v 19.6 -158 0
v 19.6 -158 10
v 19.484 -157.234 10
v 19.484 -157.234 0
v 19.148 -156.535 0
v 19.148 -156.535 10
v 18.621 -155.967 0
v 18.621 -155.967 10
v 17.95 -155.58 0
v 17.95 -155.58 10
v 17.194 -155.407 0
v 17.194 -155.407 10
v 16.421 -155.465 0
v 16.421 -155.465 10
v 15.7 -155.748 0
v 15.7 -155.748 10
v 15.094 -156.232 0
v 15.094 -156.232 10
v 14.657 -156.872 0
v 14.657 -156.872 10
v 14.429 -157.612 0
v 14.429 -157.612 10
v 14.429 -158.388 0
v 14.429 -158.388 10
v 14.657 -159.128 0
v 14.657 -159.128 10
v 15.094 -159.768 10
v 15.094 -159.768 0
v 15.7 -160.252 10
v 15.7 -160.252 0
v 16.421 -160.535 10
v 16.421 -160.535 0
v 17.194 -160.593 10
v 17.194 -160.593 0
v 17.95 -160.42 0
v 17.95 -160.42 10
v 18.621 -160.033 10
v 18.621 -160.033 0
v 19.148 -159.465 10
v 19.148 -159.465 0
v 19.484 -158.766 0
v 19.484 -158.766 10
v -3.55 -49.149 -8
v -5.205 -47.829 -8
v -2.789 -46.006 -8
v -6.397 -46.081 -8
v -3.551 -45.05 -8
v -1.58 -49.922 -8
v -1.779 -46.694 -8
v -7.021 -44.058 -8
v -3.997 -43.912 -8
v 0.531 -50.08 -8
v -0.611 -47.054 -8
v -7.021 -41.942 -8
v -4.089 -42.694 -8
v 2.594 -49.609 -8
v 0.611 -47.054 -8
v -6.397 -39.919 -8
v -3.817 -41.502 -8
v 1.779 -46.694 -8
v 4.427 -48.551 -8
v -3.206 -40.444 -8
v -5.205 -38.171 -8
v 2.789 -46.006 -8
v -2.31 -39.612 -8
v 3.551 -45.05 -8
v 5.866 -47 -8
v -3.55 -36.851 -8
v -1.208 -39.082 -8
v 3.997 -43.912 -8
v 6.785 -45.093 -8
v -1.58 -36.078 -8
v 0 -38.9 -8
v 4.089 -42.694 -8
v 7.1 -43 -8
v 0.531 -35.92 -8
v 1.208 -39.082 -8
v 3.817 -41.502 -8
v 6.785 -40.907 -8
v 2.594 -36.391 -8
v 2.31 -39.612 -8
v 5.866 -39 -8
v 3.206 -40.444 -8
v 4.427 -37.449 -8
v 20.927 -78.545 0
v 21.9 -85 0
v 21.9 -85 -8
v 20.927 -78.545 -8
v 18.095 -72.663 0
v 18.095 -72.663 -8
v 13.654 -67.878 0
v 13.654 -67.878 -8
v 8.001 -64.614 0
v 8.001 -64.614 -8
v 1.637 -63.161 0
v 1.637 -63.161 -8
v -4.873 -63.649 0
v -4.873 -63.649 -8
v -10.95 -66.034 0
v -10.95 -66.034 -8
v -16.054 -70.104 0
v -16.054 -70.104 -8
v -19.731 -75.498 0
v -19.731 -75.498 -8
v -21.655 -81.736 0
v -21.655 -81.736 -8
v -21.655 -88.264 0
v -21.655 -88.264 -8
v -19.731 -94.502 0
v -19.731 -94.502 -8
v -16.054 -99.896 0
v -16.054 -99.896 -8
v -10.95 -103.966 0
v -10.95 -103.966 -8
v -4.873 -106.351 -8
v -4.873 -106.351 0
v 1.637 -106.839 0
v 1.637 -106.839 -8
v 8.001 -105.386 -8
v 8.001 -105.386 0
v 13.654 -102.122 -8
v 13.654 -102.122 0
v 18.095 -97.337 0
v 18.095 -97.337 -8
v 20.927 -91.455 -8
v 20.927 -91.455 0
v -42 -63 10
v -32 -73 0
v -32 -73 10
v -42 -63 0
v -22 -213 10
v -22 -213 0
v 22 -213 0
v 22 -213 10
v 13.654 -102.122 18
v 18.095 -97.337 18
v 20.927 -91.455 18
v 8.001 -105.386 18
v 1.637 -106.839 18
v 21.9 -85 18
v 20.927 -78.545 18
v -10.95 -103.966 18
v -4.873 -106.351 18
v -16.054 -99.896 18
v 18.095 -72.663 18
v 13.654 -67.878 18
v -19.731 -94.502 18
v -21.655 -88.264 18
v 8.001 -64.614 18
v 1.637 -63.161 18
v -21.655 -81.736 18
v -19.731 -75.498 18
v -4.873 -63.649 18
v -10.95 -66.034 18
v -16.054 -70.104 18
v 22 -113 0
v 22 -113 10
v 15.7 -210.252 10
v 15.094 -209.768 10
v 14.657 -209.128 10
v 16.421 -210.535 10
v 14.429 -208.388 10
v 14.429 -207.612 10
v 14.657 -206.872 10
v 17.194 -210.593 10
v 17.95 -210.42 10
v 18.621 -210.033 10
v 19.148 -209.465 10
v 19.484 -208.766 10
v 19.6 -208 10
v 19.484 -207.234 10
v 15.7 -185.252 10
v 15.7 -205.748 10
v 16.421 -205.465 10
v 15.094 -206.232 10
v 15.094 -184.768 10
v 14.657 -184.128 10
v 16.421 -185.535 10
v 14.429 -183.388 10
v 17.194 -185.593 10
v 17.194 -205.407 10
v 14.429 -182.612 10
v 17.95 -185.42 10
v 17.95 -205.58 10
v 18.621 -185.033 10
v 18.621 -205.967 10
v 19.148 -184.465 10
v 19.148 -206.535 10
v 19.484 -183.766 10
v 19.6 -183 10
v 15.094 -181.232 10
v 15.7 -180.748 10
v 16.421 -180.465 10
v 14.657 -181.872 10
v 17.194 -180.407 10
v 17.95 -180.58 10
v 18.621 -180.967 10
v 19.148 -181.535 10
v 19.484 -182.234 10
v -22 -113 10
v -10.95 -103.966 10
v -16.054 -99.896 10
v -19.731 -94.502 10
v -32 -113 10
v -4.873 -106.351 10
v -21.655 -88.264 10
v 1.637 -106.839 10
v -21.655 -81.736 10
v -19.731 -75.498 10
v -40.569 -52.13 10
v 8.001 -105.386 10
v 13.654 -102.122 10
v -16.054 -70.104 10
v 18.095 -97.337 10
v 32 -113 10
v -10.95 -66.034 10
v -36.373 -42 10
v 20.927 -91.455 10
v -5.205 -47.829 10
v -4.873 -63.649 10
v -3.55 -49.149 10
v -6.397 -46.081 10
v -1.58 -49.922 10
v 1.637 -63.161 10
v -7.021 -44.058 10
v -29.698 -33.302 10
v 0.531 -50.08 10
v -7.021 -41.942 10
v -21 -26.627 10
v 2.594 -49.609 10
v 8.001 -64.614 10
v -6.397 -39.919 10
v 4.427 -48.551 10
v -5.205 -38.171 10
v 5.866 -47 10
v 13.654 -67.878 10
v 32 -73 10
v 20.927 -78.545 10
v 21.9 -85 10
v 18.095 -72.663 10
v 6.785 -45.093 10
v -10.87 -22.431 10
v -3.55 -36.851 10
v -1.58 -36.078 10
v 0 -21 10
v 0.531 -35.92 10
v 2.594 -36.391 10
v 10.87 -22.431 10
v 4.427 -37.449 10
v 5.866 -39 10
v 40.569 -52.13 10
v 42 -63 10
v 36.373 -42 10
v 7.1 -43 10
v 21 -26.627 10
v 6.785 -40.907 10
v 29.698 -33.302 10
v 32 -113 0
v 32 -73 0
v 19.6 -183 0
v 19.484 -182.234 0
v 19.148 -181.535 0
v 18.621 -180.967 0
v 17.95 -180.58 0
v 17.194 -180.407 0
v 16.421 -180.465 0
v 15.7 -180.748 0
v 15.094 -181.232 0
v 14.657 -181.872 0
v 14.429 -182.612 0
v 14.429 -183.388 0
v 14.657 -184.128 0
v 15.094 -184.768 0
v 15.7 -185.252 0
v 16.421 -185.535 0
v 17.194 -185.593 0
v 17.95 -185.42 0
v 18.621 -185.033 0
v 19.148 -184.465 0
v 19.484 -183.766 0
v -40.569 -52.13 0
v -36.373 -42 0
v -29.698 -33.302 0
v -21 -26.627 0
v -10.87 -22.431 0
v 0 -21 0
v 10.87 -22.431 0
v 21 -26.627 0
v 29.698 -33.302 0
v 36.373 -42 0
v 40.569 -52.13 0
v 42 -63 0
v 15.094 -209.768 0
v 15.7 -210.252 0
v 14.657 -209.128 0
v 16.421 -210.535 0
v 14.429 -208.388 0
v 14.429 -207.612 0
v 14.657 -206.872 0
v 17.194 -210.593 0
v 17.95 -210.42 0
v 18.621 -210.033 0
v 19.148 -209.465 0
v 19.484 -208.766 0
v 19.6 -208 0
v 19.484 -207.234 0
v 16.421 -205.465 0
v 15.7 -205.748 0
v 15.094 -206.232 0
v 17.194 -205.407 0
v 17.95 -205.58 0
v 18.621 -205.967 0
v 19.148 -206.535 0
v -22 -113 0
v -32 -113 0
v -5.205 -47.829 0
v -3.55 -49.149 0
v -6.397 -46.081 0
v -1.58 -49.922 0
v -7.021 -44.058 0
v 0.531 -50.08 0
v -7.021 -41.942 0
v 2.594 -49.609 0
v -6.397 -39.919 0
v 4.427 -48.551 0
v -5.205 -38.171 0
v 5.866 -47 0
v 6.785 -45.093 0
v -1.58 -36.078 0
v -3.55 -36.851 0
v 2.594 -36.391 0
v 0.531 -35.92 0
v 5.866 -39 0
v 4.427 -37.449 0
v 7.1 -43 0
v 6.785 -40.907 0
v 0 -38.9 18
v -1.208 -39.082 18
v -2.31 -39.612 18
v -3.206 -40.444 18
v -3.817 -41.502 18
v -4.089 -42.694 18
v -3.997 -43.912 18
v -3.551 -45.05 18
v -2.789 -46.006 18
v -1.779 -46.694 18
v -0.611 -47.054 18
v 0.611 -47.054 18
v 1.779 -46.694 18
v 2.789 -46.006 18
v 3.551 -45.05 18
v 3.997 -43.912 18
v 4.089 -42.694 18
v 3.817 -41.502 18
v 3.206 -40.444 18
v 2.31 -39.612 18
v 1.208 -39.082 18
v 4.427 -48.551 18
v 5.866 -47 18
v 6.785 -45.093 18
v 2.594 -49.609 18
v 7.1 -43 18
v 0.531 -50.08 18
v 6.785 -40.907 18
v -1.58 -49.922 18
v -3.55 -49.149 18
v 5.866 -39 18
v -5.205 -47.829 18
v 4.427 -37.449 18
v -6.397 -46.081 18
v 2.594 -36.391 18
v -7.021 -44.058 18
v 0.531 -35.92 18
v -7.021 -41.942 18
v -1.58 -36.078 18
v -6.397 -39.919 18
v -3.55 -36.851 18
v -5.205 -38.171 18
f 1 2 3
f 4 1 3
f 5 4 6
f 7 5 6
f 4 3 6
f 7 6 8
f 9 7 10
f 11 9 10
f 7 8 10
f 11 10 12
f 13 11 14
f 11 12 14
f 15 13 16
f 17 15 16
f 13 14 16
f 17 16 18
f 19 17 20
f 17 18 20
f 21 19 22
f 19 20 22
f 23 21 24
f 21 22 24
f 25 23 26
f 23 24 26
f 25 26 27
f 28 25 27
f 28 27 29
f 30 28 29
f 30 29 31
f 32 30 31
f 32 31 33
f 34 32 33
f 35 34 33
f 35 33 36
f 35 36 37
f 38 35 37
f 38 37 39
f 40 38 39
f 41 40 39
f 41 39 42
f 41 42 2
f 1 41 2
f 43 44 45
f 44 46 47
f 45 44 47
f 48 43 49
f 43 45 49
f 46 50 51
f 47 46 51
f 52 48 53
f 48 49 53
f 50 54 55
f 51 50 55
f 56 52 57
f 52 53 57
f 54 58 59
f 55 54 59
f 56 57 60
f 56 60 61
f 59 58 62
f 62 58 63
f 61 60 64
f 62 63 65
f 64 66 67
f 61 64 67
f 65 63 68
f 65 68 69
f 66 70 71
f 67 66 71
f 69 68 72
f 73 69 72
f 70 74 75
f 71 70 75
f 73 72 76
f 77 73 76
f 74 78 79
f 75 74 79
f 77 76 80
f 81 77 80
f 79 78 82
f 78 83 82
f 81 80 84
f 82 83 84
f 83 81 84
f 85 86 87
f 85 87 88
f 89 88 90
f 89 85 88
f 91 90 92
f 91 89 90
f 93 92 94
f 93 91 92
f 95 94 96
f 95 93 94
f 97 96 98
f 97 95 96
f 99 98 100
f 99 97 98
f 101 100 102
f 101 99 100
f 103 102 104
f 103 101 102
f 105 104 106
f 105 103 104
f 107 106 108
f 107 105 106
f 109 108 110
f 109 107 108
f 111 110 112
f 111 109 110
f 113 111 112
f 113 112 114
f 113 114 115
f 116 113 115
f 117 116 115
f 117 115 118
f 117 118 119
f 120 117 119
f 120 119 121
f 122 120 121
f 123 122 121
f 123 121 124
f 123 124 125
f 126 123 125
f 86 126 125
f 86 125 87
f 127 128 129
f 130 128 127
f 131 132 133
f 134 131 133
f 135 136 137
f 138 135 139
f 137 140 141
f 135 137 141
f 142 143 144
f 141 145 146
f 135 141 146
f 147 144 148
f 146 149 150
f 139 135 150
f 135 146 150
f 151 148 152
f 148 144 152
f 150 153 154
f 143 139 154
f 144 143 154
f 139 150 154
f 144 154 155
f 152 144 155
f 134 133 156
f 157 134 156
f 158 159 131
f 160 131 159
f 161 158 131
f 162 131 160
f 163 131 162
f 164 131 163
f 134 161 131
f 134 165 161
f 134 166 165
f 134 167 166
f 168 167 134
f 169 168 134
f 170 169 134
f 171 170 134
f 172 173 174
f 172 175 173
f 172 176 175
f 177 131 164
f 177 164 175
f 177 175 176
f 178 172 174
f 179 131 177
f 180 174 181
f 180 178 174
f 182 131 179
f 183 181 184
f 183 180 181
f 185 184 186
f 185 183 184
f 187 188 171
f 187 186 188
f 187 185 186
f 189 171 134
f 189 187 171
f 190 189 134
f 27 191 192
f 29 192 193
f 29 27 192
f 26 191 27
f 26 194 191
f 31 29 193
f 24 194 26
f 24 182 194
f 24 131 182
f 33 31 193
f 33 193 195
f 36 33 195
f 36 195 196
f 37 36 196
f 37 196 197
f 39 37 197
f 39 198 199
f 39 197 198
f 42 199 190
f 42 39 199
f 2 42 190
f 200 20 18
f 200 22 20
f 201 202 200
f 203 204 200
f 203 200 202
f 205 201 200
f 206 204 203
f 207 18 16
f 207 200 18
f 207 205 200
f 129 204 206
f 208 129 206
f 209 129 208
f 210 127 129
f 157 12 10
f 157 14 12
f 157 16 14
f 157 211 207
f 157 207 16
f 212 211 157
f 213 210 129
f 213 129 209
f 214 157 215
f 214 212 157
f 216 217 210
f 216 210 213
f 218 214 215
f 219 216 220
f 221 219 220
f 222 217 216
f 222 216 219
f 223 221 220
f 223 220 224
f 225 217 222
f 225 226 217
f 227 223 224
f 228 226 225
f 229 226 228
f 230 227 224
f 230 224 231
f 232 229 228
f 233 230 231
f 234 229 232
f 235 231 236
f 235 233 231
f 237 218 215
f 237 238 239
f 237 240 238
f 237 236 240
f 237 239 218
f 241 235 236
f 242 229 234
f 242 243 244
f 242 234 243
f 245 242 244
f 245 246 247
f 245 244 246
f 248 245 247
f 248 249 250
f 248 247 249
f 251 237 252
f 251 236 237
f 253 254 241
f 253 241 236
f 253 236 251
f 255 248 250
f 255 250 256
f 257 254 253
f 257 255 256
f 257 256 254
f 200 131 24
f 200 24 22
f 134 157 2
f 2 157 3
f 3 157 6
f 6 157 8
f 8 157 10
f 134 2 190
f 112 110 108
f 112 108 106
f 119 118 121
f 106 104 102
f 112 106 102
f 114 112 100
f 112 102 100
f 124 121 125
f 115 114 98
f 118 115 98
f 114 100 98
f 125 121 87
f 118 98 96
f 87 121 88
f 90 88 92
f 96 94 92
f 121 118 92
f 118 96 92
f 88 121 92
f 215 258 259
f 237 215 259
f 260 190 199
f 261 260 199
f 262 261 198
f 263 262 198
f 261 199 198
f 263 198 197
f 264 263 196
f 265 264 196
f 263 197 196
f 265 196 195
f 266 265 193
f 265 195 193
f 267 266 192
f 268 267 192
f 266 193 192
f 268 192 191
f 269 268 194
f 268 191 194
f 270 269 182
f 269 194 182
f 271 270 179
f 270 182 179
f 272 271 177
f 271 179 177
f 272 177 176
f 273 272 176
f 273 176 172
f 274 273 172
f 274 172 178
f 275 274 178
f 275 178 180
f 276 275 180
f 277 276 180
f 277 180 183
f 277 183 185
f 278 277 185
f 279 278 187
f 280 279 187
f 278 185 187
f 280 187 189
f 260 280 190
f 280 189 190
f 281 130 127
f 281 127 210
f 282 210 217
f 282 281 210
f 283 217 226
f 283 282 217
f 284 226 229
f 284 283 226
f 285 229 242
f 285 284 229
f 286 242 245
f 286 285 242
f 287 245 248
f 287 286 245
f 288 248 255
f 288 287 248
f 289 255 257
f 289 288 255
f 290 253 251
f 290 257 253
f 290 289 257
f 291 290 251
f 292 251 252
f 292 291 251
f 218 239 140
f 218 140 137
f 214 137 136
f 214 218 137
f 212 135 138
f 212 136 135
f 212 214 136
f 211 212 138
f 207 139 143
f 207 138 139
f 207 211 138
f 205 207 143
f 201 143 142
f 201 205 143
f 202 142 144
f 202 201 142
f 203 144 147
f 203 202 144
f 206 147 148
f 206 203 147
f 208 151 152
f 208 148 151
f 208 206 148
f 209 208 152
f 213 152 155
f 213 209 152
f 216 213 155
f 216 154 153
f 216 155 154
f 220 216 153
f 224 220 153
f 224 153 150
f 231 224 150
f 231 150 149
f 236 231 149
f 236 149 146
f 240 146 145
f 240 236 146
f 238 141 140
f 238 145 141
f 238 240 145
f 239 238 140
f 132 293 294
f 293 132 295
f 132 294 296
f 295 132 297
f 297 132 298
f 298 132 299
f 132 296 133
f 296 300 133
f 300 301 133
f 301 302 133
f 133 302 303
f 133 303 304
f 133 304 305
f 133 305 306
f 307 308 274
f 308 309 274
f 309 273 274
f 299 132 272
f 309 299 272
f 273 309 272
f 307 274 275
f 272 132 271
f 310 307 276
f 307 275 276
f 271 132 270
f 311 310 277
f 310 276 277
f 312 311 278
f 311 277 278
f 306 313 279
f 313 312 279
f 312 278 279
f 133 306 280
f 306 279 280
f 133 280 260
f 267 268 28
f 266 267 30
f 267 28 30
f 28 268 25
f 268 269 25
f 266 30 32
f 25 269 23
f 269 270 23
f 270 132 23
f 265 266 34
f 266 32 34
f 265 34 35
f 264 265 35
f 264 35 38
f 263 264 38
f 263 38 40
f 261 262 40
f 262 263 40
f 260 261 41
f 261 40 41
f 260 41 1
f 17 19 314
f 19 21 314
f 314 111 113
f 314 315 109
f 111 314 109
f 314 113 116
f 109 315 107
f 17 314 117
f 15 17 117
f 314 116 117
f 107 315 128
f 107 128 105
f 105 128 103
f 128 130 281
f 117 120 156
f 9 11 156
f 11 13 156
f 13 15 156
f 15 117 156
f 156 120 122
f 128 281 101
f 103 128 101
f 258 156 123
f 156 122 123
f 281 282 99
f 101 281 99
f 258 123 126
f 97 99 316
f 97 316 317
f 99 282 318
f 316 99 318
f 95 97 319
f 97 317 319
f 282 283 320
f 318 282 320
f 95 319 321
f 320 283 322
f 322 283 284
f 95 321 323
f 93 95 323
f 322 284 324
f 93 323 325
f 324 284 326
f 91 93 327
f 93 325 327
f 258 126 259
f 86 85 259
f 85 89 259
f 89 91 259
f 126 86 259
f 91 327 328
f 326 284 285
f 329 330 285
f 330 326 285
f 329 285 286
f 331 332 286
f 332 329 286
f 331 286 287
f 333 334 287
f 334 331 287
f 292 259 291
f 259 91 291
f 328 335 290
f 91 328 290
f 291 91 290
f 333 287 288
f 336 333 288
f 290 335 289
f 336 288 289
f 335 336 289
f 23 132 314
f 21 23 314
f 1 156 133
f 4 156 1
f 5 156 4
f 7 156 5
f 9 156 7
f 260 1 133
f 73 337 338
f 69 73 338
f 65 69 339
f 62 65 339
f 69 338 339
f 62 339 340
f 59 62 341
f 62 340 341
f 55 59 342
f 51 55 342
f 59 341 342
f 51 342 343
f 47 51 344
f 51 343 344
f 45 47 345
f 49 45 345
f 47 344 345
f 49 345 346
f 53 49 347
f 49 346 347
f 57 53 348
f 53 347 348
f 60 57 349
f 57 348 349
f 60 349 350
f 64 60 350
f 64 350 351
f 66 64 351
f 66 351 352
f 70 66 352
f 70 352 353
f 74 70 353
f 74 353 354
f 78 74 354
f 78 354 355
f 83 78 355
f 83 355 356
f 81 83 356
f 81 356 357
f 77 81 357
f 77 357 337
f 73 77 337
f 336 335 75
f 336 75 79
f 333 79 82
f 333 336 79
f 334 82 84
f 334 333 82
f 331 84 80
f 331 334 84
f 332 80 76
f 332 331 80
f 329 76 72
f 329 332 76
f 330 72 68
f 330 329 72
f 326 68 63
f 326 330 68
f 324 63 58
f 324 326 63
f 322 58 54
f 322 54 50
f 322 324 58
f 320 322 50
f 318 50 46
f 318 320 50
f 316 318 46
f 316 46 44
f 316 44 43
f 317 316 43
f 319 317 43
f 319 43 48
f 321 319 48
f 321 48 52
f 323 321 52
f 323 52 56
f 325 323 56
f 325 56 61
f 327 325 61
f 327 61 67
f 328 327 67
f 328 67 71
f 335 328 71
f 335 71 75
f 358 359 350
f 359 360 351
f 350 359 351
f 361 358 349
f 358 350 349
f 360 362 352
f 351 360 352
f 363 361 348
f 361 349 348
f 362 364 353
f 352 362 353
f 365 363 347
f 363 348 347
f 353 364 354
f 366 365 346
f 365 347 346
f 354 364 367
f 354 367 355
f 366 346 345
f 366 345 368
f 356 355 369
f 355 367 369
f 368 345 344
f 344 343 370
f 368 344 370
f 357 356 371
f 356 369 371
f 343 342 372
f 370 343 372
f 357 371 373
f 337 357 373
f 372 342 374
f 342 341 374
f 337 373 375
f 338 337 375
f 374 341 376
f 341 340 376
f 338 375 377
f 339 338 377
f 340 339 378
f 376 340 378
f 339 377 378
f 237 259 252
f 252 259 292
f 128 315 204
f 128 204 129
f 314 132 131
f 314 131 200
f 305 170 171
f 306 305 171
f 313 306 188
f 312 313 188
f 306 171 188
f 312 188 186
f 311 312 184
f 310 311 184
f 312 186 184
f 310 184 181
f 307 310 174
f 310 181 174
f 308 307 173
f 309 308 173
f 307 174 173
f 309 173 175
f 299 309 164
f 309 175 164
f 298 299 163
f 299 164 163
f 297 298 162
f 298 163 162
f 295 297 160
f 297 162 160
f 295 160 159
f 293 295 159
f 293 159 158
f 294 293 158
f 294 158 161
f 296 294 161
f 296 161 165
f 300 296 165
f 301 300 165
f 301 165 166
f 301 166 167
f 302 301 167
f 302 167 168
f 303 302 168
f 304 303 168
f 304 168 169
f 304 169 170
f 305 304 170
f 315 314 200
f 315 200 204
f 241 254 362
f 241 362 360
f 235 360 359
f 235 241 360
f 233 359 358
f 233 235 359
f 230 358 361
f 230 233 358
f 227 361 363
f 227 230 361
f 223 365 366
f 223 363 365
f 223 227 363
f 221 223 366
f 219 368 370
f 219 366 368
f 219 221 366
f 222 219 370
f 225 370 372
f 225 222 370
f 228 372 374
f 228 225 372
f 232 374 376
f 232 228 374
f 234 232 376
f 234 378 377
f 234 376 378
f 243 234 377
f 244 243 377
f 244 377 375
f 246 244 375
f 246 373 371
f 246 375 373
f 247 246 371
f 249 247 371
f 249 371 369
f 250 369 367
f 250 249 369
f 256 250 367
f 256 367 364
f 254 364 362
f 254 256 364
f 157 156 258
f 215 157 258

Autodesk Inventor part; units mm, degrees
ref_plane "YZ Plane" through (0, 0, 0) normal (1, 0, 0) x (0, 1, 0)
ref_plane "XZ Plane" through (0, 0, 0) normal (0, 1, 0) x (-1, 0, 0)
ref_plane "XY Plane" through (0, 0, 0) normal (0, 0, 1) x (1, 0, 0)
sketch "Sketch1" plane through (0, 0, 0) normal (0, 0, 1) x (1, 0, 0)
  arc A0 (-44.1071, -48.8952) -> (-20.8929, -67.8977) centre (-32.5, -58.3964) ccw projected
  arc A1 (-43.869, -48.6061) -> (-44.1071, -48.8952) centre (0, -85) ccw projected
  line L0 (-36.9673, -34.403) -> (-43.869, -48.6061) projected
  arc A2 (-36.9673, -34.403) -> (-25, 17.6067) centre (-144, 17.6067) ccw projected
  line L1 (-25, 17.6067) -> (-25, 75) projected
  line L2 (-25, 75) -> (25, 75) projected
  line L3 (25, 75) -> (25, 17.6067) projected
  arc A3 (25, 17.6067) -> (36.9673, -34.403) centre (144, 17.6067) ccw projected
  line L4 (43.869, -48.6061) -> (36.9673, -34.403) projected
  arc A4 (44.1071, -48.8952) -> (43.869, -48.6061) centre (0, -85) ccw projected
  arc A5 (20.8929, -67.8977) -> (44.1071, -48.8952) centre (32.5, -58.3964) ccw projected
  arc A6 (20.8929, -67.8977) -> (-20.8929, -67.8977) centre (0, -85) ccw projected
  circle A7 centre (-16, 24) radius 2.1 projected
  circle A8 centre (16, 60) radius 2.1 projected
  circle A9 centre (-16, 60) radius 2.1 projected
  circle A10 centre (16, 24) radius 2.1 projected
  arc A11 (38.0714, -53.8358) -> (-38.0714, -53.8358) centre (0, -85) ccw projected
  arc A12 (-38.0714, -53.8358) -> (-26.9286, -62.957) centre (-32.5, -58.3964) ccw projected
  arc A13 (26.9286, -62.957) -> (-26.9286, -62.957) centre (0, -85) ccw projected
  arc A14 (26.9286, -62.957) -> (38.0714, -53.8358) centre (32.5, -58.3964) ccw projected
  circle A15 centre (0, -43) radius 7.1
  line L5 (0, -35.8) -> (0, -50.2) construction
  circle A16 centre (0, -85) radius 21.9
  line L6 (0, -63) -> (0, -213) construction
  line L7 (-42, -63) -> (-42, -213)
  line L8 (42, -213) -> (42, -63)
  arc A17 (42, -63) -> (-42, -63) centre (0, -63) ccw
  arc A18 (-42, -213) -> (42, -213) centre (0, -213) ccw
  point P0 (0, 0)
  point P1 (0, -138)
  dimension "d0" = 14.2
  dimension "d1" = 7.2
  dimension "d2" = 27
  dimension "d3" = 43.8
  dimension "d4" = 42
  dimension "d5" = 150
  dimension "d6" = 20
extrude "Extrusion1" add sketch "Sketch1" against normal blind 8 contours A15 | A16
sketch "Sketch2" plane through (0, -85, 0) normal (0, 0, 1) x (1, 0, 0)
  line L0 (-42, 22) -> (-42, -128) projected
  arc A0 (42, 22) -> (-42, 22) centre (0, 22) ccw projected
  line L1 (42, -128) -> (42, 22) projected
  arc A1 (-42, -128) -> (42, -128) centre (0, -128) ccw projected
  circle A2 centre (0, 0) radius 21.9 projected
  circle A3 centre (0, 42) radius 7.1 projected
  point P0 (0, 85)
extrude "Extrusion2" add sketch "Sketch2" along normal blind 10 contours A0 L1 A1 L0 | A2 | A3
sketch "Sketch4" plane through (0, -85, 0) normal (0, 0, -1) x (-1, 0, 0)
  circle A0 centre (0, 0) radius 21.9 projected
  circle A1 centre (0, 42) radius 7.1 projected
  arc A2 (-42, -128) -> (42, -128) centre (0, -128) ccw projected
  line L0 (42, 22) -> (42, -128) projected
  arc A3 (42, 22) -> (-42, 22) centre (0, 22) ccw projected
  line L1 (-42, -128) -> (-42, 22) projected
  arc A4 (-42, -128) -> (42, -128) centre (0, -128) ccw projected
  line L2 (42, -128) -> (-42, -128)
  line L3 (32, -128) -> (32, 12)
  arc A5 (42, 22) -> (-42, 22) centre (0, 22) ccw projected
  line L4 (32, 12) -> (42, 22)
  line L5 (0, -128) -> (0, 42) construction
  line L6 (-32, -128) -> (-32, 12)
  line L7 (-32, 12) -> (-42, 22)
  line L8 (22, -128) -> (22, -28)
  line L9 (22, -28) -> (32, -28)
  line L10 (-22, -128) -> (-22, -28)
  line L11 (-22, -28) -> (-32, -28)
  point P0 (0, 85)
  point P1 (-32, -28)
  dimension "d18" = 10
  dimension "d19" = 135
  dimension "d22" = 10
  dimension "d23" = 100
extrude "Extrusion3" cut sketch "Sketch4" against normal blind 10 contours L2 A2 | L1 L7 L6 L2 | L2 L3 L4 L0 | L6 L11 L10 L2 | L2 L8 L9 L3
sketch "Sketch5" plane through (0, -85, 10) normal (0, 0, 1) x (1, 0, 0)
  circle A0 centre (17, -73) radius 2.6 projected
  circle A1 centre (17, -98) radius 2.6 projected
  circle A2 centre (17, -123) radius 2.6 projected
  point P0 (0, 85)
extrude "Extrusion4" cut sketch "Sketch5" against normal through all
ref_plane "Work Plane1" through (0, -85, 5) normal (0, 0, 1) x (1, 0, 0)
mirror "Mirror1" about plane through (0, -85, 5) normal (0, 0, 1) of "Extrusion1"
sketch "Sketch3" plane through (0, -43, -8) normal (0, 0, -1) x (-1, 0, 0)
  circle A0 centre (0, 0) radius 7.1 projected
  point P0 (0, 43)
hole "Hole1" at (0, -43, -8) direction (0, 0, 1) diameter 8.2 end through all
properties part number "17_Khau_noi_tiep_cuoi" material "Stainless Steel, Austenitic"
